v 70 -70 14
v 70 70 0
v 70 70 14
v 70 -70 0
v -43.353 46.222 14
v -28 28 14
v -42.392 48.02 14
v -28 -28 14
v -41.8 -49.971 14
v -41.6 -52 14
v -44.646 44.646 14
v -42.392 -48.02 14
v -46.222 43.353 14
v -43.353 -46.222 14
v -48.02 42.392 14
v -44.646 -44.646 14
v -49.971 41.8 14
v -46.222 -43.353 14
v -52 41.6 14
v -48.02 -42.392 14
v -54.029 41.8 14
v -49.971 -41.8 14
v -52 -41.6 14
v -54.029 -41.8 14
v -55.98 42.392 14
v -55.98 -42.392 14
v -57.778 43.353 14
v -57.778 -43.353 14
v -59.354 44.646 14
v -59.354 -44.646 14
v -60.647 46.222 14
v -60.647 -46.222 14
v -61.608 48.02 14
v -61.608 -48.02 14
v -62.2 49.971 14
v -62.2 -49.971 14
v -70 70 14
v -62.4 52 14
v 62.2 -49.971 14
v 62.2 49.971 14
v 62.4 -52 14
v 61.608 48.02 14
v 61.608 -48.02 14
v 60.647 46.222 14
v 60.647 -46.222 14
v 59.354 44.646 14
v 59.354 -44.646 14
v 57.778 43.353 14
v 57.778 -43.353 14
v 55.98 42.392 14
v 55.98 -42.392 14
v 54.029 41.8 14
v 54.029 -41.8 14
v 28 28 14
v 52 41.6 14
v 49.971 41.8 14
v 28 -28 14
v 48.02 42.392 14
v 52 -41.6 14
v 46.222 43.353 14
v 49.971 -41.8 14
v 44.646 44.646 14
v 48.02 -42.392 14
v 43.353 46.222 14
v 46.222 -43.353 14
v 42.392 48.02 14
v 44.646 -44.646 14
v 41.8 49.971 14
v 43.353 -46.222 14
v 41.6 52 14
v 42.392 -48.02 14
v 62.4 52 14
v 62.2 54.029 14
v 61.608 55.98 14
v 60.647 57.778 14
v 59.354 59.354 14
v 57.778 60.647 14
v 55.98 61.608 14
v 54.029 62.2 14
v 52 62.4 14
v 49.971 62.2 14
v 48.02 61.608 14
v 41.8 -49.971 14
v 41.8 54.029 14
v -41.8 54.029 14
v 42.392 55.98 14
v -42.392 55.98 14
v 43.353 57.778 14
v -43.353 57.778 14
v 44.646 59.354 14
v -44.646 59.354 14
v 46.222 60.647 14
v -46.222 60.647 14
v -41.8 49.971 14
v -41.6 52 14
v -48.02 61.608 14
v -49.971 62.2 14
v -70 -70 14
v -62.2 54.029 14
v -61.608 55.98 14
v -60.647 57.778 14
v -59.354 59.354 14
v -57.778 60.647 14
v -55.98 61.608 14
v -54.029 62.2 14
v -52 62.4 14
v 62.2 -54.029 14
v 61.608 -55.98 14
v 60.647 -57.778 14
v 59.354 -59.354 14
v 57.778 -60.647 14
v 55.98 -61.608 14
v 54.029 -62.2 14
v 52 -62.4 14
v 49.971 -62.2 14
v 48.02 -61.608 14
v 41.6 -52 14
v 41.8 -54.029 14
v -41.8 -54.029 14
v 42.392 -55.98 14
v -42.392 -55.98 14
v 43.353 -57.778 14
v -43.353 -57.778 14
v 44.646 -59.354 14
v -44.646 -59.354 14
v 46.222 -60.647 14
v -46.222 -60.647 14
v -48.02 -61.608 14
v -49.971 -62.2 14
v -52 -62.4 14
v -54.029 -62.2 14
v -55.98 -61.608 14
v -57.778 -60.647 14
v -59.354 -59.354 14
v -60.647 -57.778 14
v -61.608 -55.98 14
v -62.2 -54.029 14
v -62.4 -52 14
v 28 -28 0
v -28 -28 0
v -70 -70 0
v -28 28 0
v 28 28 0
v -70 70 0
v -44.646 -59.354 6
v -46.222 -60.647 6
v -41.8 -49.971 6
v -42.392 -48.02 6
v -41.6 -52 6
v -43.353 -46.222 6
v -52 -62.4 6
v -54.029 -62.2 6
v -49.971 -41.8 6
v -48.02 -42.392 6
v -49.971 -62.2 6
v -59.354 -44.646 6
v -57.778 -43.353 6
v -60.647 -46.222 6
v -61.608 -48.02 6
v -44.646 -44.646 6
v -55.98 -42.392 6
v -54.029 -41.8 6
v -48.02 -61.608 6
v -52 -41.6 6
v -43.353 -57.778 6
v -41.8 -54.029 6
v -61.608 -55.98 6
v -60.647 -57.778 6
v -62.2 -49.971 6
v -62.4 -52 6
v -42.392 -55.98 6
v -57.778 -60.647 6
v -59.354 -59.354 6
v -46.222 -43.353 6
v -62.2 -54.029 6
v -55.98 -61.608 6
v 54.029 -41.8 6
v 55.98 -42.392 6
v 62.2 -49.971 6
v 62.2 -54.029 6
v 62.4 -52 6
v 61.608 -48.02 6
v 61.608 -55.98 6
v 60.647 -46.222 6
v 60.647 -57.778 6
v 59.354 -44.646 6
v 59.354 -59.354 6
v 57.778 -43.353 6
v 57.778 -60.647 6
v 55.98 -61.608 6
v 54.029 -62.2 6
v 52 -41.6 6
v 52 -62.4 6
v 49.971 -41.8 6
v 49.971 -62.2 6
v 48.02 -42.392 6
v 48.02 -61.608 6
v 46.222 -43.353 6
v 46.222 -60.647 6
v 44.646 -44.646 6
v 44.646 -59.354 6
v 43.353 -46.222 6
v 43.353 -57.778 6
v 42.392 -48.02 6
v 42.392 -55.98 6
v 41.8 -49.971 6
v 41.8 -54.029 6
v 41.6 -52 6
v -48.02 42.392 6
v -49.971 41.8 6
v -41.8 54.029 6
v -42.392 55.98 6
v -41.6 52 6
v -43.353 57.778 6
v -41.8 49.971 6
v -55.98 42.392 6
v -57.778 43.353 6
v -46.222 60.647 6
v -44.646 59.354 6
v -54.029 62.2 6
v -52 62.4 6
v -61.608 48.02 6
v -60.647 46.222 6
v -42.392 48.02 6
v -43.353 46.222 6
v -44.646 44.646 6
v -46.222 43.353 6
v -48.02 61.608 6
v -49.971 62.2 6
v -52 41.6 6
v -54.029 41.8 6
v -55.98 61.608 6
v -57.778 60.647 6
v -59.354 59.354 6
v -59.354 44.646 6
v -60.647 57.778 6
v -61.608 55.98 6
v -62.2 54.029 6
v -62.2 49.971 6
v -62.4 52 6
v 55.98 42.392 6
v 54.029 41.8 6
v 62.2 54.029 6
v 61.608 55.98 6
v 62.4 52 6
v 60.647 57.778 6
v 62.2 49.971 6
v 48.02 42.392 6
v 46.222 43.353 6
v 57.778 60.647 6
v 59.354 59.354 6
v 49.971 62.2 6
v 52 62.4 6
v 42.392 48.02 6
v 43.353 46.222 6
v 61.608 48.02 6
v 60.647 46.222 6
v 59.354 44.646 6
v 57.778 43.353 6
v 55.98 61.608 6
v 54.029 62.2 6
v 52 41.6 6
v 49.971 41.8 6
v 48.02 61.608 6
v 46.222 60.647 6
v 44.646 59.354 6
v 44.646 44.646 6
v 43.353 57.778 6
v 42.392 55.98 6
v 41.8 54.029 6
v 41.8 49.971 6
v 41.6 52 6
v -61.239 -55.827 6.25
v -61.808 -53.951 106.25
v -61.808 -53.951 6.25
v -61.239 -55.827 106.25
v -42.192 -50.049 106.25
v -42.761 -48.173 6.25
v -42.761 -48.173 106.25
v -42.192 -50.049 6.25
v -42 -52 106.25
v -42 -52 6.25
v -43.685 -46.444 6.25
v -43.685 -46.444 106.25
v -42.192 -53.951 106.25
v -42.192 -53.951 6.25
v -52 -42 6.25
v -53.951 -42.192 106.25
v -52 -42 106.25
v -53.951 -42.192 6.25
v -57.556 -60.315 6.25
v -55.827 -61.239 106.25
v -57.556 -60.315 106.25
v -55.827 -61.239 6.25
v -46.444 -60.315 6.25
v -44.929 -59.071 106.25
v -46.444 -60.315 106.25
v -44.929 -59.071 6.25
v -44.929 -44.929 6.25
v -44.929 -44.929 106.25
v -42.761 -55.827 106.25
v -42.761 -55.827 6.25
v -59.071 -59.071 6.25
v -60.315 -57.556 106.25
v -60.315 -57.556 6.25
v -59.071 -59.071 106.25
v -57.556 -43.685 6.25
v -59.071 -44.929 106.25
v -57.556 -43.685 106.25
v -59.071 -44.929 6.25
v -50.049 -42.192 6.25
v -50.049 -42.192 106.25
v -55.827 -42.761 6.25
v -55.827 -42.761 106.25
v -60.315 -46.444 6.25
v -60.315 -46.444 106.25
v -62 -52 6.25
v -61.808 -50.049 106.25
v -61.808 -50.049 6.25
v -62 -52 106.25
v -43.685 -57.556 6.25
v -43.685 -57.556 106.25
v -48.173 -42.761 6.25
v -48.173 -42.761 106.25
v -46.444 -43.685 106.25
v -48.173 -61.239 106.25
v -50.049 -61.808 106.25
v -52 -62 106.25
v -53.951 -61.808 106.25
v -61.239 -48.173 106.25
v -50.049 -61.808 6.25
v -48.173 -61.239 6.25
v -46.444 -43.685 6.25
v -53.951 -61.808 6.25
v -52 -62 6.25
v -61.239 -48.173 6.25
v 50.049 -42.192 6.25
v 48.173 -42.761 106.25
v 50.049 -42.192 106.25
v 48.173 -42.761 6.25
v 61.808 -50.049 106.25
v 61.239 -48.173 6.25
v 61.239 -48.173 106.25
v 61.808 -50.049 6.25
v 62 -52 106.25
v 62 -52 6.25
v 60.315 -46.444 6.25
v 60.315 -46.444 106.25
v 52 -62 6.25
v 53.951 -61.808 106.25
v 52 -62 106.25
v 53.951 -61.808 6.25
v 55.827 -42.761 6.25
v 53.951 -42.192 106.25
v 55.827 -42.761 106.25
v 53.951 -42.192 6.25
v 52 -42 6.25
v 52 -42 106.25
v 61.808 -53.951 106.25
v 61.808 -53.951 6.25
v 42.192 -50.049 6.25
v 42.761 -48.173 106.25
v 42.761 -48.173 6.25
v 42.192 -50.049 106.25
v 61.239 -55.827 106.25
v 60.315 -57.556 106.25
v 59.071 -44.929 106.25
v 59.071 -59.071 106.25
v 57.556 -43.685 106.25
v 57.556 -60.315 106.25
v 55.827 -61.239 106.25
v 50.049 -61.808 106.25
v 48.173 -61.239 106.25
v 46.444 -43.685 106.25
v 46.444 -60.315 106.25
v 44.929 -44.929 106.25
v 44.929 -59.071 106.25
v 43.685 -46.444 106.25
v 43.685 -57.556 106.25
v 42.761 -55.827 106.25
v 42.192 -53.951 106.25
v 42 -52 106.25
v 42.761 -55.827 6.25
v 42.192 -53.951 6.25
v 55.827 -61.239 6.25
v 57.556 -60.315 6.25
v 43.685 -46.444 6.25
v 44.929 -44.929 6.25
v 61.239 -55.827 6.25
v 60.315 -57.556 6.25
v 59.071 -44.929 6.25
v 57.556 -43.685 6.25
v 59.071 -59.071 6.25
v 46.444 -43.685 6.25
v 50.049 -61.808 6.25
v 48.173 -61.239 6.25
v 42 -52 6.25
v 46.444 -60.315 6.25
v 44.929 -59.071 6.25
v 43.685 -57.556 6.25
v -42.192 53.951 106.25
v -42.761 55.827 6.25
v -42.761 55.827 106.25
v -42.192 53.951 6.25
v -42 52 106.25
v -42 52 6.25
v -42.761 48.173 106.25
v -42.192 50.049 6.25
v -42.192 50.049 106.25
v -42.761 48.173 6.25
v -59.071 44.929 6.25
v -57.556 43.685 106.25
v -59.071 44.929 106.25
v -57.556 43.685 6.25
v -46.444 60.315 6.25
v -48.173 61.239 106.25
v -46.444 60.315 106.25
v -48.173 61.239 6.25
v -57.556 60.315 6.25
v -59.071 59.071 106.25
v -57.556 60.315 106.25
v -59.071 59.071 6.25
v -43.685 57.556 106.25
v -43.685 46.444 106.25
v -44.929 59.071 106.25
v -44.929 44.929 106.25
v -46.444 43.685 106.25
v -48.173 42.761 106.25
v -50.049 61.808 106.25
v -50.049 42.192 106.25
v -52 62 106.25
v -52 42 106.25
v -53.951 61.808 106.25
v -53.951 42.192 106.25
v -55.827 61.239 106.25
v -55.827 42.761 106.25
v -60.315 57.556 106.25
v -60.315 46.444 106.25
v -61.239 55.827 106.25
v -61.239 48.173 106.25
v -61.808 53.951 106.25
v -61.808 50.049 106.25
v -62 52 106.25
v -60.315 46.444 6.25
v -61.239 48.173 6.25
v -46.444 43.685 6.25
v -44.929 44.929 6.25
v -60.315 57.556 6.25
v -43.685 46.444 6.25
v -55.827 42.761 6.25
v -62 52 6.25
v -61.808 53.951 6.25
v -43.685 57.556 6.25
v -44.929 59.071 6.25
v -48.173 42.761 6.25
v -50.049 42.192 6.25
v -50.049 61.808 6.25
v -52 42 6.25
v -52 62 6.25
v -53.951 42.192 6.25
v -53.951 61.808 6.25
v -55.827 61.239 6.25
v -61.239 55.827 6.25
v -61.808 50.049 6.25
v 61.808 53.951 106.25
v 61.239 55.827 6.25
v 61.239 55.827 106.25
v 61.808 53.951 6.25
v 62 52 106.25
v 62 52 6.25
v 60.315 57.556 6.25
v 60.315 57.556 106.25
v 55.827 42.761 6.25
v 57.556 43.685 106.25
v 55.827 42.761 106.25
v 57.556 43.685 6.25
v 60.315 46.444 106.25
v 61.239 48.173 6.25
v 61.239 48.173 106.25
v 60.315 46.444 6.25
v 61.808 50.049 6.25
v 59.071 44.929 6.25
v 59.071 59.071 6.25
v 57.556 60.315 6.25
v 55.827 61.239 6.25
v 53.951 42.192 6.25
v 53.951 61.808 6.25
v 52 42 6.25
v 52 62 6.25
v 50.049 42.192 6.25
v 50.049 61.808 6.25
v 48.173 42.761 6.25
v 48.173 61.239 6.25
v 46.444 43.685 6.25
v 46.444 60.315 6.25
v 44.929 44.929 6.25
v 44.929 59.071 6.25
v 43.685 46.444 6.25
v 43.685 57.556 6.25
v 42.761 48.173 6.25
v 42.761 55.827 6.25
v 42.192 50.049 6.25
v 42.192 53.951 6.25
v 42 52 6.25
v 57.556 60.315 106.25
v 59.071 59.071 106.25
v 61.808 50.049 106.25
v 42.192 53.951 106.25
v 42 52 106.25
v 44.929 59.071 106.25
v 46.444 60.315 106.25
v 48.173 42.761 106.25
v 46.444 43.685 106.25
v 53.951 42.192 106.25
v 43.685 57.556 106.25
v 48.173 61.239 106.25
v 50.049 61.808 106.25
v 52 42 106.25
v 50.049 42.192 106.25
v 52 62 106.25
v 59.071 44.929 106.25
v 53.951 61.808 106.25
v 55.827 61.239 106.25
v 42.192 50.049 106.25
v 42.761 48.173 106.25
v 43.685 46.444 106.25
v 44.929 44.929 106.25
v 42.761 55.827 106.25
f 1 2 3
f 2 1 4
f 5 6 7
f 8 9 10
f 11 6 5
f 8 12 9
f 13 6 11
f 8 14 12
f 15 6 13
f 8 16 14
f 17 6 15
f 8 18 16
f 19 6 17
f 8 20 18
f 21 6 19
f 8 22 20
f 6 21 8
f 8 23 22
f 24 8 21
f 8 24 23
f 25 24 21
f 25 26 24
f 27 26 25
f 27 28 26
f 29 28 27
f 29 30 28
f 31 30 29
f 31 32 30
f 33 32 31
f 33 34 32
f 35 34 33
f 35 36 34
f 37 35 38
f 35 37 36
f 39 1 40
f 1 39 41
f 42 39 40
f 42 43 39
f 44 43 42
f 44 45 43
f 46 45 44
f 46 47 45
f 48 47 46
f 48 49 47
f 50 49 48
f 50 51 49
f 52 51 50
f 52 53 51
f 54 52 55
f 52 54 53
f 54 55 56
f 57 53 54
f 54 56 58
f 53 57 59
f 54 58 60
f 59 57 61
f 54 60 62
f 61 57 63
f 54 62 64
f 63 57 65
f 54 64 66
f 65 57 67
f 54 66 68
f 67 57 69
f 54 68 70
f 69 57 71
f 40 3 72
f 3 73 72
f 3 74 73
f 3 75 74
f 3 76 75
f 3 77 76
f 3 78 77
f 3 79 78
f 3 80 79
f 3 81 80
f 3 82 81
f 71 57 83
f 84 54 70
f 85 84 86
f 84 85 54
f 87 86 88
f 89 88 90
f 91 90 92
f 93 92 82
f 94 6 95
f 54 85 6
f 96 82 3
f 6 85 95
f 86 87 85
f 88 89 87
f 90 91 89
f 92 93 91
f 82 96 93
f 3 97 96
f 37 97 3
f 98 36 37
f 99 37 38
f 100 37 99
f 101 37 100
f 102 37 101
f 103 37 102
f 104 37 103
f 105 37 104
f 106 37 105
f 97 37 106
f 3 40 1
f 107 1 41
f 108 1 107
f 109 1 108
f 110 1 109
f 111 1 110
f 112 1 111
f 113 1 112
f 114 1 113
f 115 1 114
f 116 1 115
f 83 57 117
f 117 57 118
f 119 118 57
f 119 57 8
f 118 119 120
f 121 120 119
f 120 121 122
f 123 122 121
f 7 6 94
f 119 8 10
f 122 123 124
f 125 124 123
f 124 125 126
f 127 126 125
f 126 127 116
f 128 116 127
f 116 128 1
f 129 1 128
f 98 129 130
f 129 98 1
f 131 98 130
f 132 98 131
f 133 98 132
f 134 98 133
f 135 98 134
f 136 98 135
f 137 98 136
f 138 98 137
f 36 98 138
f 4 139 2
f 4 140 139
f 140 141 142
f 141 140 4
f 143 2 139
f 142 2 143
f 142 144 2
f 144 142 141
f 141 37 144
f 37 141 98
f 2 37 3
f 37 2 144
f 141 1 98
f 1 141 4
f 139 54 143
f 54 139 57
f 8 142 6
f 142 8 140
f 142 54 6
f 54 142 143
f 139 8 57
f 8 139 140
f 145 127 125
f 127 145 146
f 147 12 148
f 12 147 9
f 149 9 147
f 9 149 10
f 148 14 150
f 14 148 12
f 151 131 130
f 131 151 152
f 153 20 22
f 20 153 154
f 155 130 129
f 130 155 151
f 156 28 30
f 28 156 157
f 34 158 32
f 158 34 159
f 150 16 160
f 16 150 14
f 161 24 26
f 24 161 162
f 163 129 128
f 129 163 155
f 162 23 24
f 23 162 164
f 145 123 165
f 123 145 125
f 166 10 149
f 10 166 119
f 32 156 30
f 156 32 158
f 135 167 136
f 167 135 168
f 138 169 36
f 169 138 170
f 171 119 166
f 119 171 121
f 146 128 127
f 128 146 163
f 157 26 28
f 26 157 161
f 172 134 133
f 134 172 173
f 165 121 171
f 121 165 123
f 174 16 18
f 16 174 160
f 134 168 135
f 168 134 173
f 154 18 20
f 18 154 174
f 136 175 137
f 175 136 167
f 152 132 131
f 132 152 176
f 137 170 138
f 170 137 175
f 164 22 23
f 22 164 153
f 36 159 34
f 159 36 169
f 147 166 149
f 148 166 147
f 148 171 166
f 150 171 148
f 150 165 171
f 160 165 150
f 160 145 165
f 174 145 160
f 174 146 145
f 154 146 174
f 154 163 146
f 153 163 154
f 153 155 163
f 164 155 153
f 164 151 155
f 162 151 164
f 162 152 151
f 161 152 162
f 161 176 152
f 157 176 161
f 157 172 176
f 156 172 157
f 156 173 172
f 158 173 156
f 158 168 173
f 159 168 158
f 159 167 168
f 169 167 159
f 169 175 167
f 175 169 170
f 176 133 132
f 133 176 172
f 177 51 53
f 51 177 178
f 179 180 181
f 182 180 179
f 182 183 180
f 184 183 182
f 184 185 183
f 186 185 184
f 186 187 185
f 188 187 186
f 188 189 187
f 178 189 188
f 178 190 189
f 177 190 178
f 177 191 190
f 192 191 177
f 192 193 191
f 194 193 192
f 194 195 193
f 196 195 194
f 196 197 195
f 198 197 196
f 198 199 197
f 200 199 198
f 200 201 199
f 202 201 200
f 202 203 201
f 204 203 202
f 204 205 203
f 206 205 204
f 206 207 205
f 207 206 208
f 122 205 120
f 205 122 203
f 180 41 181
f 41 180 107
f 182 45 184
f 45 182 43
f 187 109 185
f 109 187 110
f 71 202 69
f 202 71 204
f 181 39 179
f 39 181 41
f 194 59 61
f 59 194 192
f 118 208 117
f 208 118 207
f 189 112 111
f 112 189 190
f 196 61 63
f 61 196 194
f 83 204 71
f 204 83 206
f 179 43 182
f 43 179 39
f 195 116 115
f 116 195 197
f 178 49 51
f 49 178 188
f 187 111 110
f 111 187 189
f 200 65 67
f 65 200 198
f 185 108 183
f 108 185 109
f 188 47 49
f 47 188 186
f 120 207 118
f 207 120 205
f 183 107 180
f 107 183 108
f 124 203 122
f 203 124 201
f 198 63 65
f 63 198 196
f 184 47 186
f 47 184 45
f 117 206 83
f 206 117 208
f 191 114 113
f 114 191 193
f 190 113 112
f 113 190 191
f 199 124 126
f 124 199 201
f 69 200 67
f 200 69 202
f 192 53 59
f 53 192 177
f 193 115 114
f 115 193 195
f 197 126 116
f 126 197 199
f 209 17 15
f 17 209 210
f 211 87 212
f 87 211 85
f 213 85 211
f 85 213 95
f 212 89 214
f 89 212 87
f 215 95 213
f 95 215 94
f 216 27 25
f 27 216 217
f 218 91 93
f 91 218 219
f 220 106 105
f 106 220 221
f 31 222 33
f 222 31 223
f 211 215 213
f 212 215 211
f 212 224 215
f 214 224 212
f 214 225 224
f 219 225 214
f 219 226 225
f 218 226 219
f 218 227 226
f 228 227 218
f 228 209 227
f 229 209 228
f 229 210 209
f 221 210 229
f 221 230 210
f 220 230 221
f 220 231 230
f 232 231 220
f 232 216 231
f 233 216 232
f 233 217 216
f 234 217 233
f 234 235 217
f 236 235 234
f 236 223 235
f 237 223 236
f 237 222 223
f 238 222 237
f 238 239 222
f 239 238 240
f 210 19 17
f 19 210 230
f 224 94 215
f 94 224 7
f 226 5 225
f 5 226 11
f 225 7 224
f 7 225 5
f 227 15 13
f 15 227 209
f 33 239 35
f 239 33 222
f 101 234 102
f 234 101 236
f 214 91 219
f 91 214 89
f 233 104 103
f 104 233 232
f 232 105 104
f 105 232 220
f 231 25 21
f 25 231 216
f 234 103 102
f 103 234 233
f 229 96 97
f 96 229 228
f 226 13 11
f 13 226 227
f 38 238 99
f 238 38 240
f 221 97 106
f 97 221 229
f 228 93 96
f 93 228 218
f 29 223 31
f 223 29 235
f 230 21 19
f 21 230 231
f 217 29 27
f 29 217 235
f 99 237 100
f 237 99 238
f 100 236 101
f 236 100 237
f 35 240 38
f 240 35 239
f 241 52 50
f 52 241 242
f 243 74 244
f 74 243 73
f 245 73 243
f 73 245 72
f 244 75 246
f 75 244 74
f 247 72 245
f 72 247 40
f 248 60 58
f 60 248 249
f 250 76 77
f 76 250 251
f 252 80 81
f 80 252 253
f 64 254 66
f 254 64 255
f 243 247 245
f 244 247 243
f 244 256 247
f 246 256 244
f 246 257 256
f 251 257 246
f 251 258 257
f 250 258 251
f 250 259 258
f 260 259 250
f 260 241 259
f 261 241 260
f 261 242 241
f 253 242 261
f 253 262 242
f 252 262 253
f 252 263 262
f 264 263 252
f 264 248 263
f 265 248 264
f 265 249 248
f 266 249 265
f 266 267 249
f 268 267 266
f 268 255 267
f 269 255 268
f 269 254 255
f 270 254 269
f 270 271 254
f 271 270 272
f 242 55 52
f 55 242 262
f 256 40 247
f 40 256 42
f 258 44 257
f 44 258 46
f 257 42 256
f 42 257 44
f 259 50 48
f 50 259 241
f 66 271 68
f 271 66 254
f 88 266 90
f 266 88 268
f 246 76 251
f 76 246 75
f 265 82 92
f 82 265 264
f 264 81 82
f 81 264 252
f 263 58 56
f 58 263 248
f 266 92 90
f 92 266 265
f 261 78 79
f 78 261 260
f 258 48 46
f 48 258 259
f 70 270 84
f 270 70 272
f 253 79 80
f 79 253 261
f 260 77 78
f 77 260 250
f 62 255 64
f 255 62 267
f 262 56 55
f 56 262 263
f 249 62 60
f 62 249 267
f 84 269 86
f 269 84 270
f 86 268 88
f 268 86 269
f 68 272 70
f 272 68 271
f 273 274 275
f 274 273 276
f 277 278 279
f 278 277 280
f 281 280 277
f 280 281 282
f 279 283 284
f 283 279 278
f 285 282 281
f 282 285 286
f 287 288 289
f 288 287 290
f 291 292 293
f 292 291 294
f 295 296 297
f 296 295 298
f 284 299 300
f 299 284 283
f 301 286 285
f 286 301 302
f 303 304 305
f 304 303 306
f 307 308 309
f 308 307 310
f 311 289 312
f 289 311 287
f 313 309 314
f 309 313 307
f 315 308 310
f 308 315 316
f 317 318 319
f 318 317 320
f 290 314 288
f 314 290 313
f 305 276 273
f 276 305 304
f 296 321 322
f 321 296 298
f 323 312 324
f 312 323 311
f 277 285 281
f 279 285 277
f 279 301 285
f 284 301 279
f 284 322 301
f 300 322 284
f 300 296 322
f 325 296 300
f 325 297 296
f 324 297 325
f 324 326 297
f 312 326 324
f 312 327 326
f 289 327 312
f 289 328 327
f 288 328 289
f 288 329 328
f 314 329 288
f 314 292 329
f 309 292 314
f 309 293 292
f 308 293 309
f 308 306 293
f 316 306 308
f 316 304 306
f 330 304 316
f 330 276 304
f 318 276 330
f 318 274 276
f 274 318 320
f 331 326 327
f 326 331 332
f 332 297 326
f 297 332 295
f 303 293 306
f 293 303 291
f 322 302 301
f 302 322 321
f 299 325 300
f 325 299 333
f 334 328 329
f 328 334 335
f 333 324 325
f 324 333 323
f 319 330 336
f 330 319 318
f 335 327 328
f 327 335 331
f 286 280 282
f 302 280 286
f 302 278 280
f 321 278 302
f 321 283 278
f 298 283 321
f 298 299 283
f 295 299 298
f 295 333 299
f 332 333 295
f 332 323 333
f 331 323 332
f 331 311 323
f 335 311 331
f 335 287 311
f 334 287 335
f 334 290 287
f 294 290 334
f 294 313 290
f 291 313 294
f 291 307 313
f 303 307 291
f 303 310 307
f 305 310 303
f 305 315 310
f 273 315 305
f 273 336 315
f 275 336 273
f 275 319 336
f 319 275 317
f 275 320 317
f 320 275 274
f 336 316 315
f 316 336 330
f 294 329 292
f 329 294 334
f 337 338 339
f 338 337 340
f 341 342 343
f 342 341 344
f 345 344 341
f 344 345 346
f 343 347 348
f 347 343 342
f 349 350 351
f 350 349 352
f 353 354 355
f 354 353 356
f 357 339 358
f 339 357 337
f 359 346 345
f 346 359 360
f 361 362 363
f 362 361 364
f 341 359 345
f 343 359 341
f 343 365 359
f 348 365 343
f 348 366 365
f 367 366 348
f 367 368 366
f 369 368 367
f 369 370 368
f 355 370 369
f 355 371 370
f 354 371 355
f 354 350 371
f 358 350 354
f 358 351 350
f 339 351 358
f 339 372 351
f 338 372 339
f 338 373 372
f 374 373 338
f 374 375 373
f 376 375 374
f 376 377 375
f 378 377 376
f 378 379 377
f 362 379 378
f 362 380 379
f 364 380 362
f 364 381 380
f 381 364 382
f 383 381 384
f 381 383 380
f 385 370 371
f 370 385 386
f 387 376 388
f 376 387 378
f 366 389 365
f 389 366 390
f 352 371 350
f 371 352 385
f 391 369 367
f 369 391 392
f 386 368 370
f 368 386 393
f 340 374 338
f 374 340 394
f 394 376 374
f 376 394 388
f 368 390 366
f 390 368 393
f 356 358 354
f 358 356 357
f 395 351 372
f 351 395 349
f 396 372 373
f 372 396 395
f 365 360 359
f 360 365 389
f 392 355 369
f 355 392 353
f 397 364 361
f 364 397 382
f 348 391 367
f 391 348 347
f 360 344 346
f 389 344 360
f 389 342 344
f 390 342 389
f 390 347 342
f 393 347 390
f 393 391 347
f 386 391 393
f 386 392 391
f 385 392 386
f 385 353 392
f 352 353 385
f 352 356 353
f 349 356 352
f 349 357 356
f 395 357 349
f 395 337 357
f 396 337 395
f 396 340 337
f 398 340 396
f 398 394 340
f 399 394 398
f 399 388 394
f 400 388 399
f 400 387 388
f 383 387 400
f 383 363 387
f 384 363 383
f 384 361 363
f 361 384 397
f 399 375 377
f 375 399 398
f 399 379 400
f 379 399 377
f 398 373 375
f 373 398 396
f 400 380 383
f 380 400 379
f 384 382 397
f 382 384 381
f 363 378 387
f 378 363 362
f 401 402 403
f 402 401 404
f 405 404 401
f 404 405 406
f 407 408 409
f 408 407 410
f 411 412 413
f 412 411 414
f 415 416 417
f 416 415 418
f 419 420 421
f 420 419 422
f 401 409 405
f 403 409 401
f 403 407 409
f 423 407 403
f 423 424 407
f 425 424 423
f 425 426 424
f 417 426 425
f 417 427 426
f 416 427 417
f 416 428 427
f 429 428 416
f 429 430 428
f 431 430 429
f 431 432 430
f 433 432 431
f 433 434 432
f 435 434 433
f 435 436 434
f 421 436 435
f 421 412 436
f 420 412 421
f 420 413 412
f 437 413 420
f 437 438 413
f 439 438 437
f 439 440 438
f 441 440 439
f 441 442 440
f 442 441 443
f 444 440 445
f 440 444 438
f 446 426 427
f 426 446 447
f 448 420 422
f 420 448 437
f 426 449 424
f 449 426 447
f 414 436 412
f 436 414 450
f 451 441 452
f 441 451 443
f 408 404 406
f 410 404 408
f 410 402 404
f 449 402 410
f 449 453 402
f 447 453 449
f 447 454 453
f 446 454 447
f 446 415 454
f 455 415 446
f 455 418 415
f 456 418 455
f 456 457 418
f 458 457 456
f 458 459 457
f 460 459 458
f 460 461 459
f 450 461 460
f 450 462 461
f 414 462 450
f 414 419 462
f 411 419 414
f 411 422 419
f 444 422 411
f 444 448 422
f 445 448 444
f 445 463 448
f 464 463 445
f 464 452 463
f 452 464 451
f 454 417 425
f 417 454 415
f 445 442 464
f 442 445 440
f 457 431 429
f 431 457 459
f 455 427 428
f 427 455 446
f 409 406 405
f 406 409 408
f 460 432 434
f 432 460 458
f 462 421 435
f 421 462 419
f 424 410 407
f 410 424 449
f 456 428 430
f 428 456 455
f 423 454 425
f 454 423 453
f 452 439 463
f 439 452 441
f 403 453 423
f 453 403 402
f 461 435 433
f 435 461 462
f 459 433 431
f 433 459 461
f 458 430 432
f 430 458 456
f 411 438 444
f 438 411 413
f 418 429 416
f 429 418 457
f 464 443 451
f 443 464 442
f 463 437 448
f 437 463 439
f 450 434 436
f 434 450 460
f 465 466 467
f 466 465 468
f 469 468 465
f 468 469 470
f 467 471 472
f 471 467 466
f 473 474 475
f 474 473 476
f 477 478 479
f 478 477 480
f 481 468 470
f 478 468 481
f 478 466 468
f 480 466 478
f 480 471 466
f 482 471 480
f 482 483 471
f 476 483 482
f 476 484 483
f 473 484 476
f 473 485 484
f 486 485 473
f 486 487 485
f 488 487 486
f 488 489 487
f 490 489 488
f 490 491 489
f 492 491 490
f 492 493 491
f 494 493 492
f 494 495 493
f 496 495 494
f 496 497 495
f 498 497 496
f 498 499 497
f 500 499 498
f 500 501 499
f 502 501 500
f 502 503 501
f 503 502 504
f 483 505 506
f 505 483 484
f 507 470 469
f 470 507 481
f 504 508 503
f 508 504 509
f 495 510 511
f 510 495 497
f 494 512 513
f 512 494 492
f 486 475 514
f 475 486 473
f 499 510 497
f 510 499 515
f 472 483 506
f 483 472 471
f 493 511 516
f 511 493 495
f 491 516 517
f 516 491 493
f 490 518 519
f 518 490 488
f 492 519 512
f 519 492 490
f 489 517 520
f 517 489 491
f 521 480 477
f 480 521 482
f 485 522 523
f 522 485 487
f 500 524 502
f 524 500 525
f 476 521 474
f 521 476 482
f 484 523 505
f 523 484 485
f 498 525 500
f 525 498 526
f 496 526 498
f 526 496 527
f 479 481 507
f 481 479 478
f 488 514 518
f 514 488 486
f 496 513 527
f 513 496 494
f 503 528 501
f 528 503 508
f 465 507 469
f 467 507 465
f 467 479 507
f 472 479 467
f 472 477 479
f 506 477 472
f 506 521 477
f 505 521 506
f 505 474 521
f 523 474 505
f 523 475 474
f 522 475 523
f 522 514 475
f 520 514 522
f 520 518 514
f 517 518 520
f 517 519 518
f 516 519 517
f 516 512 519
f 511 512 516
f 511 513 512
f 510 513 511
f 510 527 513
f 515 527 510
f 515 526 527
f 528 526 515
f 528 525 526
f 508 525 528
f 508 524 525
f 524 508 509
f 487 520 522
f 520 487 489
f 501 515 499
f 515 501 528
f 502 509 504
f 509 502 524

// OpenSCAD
$fn = 32;

// ------------------------------------------------------------------------
// Frame with four posts: 140 x 140 mm frame, four d20 posts
// Every part is its own module, assembly() places them once.
// ------------------------------------------------------------------------

// --- part 1 ---
module base_frame() {
  difference() {
    translate([-70, -70, 0]) cube([140, 140, 14]);
    translate([-28, -28, -1]) cube([56, 56, 16]);
    translate([-52, -52, 6]) cylinder(h = 9, d = 20.8);
    translate([52, -52, 6]) cylinder(h = 9, d = 20.8);
    translate([-52, 52, 6]) cylinder(h = 9, d = 20.8);
    translate([52, 52, 6]) cylinder(h = 9, d = 20.8);
  }
}

// --- part 2 ---
module post1() {
  cylinder(h = 100, d = 20);
}

// --- part 3 ---
module post2() {
  cylinder(h = 100, d = 20);
}

// --- part 4 ---
module post3() {
  cylinder(h = 100, d = 20);
}

// --- part 5 ---
module post4() {
  cylinder(h = 100, d = 20);
}

// --- assembly ---
module assembly() {
  translate([0, 0, 0]) rotate([0, 0, 0]) base_frame();
  translate([-52, -52, 6.25]) rotate([0, 0, 0]) post1();
  translate([52, -52, 6.25]) rotate([0, 0, 0]) post2();
  translate([-52, 52, 6.25]) rotate([0, 0, 0]) post3();
  translate([52, 52, 6.25]) rotate([0, 0, 0]) post4();
}

assembly();
